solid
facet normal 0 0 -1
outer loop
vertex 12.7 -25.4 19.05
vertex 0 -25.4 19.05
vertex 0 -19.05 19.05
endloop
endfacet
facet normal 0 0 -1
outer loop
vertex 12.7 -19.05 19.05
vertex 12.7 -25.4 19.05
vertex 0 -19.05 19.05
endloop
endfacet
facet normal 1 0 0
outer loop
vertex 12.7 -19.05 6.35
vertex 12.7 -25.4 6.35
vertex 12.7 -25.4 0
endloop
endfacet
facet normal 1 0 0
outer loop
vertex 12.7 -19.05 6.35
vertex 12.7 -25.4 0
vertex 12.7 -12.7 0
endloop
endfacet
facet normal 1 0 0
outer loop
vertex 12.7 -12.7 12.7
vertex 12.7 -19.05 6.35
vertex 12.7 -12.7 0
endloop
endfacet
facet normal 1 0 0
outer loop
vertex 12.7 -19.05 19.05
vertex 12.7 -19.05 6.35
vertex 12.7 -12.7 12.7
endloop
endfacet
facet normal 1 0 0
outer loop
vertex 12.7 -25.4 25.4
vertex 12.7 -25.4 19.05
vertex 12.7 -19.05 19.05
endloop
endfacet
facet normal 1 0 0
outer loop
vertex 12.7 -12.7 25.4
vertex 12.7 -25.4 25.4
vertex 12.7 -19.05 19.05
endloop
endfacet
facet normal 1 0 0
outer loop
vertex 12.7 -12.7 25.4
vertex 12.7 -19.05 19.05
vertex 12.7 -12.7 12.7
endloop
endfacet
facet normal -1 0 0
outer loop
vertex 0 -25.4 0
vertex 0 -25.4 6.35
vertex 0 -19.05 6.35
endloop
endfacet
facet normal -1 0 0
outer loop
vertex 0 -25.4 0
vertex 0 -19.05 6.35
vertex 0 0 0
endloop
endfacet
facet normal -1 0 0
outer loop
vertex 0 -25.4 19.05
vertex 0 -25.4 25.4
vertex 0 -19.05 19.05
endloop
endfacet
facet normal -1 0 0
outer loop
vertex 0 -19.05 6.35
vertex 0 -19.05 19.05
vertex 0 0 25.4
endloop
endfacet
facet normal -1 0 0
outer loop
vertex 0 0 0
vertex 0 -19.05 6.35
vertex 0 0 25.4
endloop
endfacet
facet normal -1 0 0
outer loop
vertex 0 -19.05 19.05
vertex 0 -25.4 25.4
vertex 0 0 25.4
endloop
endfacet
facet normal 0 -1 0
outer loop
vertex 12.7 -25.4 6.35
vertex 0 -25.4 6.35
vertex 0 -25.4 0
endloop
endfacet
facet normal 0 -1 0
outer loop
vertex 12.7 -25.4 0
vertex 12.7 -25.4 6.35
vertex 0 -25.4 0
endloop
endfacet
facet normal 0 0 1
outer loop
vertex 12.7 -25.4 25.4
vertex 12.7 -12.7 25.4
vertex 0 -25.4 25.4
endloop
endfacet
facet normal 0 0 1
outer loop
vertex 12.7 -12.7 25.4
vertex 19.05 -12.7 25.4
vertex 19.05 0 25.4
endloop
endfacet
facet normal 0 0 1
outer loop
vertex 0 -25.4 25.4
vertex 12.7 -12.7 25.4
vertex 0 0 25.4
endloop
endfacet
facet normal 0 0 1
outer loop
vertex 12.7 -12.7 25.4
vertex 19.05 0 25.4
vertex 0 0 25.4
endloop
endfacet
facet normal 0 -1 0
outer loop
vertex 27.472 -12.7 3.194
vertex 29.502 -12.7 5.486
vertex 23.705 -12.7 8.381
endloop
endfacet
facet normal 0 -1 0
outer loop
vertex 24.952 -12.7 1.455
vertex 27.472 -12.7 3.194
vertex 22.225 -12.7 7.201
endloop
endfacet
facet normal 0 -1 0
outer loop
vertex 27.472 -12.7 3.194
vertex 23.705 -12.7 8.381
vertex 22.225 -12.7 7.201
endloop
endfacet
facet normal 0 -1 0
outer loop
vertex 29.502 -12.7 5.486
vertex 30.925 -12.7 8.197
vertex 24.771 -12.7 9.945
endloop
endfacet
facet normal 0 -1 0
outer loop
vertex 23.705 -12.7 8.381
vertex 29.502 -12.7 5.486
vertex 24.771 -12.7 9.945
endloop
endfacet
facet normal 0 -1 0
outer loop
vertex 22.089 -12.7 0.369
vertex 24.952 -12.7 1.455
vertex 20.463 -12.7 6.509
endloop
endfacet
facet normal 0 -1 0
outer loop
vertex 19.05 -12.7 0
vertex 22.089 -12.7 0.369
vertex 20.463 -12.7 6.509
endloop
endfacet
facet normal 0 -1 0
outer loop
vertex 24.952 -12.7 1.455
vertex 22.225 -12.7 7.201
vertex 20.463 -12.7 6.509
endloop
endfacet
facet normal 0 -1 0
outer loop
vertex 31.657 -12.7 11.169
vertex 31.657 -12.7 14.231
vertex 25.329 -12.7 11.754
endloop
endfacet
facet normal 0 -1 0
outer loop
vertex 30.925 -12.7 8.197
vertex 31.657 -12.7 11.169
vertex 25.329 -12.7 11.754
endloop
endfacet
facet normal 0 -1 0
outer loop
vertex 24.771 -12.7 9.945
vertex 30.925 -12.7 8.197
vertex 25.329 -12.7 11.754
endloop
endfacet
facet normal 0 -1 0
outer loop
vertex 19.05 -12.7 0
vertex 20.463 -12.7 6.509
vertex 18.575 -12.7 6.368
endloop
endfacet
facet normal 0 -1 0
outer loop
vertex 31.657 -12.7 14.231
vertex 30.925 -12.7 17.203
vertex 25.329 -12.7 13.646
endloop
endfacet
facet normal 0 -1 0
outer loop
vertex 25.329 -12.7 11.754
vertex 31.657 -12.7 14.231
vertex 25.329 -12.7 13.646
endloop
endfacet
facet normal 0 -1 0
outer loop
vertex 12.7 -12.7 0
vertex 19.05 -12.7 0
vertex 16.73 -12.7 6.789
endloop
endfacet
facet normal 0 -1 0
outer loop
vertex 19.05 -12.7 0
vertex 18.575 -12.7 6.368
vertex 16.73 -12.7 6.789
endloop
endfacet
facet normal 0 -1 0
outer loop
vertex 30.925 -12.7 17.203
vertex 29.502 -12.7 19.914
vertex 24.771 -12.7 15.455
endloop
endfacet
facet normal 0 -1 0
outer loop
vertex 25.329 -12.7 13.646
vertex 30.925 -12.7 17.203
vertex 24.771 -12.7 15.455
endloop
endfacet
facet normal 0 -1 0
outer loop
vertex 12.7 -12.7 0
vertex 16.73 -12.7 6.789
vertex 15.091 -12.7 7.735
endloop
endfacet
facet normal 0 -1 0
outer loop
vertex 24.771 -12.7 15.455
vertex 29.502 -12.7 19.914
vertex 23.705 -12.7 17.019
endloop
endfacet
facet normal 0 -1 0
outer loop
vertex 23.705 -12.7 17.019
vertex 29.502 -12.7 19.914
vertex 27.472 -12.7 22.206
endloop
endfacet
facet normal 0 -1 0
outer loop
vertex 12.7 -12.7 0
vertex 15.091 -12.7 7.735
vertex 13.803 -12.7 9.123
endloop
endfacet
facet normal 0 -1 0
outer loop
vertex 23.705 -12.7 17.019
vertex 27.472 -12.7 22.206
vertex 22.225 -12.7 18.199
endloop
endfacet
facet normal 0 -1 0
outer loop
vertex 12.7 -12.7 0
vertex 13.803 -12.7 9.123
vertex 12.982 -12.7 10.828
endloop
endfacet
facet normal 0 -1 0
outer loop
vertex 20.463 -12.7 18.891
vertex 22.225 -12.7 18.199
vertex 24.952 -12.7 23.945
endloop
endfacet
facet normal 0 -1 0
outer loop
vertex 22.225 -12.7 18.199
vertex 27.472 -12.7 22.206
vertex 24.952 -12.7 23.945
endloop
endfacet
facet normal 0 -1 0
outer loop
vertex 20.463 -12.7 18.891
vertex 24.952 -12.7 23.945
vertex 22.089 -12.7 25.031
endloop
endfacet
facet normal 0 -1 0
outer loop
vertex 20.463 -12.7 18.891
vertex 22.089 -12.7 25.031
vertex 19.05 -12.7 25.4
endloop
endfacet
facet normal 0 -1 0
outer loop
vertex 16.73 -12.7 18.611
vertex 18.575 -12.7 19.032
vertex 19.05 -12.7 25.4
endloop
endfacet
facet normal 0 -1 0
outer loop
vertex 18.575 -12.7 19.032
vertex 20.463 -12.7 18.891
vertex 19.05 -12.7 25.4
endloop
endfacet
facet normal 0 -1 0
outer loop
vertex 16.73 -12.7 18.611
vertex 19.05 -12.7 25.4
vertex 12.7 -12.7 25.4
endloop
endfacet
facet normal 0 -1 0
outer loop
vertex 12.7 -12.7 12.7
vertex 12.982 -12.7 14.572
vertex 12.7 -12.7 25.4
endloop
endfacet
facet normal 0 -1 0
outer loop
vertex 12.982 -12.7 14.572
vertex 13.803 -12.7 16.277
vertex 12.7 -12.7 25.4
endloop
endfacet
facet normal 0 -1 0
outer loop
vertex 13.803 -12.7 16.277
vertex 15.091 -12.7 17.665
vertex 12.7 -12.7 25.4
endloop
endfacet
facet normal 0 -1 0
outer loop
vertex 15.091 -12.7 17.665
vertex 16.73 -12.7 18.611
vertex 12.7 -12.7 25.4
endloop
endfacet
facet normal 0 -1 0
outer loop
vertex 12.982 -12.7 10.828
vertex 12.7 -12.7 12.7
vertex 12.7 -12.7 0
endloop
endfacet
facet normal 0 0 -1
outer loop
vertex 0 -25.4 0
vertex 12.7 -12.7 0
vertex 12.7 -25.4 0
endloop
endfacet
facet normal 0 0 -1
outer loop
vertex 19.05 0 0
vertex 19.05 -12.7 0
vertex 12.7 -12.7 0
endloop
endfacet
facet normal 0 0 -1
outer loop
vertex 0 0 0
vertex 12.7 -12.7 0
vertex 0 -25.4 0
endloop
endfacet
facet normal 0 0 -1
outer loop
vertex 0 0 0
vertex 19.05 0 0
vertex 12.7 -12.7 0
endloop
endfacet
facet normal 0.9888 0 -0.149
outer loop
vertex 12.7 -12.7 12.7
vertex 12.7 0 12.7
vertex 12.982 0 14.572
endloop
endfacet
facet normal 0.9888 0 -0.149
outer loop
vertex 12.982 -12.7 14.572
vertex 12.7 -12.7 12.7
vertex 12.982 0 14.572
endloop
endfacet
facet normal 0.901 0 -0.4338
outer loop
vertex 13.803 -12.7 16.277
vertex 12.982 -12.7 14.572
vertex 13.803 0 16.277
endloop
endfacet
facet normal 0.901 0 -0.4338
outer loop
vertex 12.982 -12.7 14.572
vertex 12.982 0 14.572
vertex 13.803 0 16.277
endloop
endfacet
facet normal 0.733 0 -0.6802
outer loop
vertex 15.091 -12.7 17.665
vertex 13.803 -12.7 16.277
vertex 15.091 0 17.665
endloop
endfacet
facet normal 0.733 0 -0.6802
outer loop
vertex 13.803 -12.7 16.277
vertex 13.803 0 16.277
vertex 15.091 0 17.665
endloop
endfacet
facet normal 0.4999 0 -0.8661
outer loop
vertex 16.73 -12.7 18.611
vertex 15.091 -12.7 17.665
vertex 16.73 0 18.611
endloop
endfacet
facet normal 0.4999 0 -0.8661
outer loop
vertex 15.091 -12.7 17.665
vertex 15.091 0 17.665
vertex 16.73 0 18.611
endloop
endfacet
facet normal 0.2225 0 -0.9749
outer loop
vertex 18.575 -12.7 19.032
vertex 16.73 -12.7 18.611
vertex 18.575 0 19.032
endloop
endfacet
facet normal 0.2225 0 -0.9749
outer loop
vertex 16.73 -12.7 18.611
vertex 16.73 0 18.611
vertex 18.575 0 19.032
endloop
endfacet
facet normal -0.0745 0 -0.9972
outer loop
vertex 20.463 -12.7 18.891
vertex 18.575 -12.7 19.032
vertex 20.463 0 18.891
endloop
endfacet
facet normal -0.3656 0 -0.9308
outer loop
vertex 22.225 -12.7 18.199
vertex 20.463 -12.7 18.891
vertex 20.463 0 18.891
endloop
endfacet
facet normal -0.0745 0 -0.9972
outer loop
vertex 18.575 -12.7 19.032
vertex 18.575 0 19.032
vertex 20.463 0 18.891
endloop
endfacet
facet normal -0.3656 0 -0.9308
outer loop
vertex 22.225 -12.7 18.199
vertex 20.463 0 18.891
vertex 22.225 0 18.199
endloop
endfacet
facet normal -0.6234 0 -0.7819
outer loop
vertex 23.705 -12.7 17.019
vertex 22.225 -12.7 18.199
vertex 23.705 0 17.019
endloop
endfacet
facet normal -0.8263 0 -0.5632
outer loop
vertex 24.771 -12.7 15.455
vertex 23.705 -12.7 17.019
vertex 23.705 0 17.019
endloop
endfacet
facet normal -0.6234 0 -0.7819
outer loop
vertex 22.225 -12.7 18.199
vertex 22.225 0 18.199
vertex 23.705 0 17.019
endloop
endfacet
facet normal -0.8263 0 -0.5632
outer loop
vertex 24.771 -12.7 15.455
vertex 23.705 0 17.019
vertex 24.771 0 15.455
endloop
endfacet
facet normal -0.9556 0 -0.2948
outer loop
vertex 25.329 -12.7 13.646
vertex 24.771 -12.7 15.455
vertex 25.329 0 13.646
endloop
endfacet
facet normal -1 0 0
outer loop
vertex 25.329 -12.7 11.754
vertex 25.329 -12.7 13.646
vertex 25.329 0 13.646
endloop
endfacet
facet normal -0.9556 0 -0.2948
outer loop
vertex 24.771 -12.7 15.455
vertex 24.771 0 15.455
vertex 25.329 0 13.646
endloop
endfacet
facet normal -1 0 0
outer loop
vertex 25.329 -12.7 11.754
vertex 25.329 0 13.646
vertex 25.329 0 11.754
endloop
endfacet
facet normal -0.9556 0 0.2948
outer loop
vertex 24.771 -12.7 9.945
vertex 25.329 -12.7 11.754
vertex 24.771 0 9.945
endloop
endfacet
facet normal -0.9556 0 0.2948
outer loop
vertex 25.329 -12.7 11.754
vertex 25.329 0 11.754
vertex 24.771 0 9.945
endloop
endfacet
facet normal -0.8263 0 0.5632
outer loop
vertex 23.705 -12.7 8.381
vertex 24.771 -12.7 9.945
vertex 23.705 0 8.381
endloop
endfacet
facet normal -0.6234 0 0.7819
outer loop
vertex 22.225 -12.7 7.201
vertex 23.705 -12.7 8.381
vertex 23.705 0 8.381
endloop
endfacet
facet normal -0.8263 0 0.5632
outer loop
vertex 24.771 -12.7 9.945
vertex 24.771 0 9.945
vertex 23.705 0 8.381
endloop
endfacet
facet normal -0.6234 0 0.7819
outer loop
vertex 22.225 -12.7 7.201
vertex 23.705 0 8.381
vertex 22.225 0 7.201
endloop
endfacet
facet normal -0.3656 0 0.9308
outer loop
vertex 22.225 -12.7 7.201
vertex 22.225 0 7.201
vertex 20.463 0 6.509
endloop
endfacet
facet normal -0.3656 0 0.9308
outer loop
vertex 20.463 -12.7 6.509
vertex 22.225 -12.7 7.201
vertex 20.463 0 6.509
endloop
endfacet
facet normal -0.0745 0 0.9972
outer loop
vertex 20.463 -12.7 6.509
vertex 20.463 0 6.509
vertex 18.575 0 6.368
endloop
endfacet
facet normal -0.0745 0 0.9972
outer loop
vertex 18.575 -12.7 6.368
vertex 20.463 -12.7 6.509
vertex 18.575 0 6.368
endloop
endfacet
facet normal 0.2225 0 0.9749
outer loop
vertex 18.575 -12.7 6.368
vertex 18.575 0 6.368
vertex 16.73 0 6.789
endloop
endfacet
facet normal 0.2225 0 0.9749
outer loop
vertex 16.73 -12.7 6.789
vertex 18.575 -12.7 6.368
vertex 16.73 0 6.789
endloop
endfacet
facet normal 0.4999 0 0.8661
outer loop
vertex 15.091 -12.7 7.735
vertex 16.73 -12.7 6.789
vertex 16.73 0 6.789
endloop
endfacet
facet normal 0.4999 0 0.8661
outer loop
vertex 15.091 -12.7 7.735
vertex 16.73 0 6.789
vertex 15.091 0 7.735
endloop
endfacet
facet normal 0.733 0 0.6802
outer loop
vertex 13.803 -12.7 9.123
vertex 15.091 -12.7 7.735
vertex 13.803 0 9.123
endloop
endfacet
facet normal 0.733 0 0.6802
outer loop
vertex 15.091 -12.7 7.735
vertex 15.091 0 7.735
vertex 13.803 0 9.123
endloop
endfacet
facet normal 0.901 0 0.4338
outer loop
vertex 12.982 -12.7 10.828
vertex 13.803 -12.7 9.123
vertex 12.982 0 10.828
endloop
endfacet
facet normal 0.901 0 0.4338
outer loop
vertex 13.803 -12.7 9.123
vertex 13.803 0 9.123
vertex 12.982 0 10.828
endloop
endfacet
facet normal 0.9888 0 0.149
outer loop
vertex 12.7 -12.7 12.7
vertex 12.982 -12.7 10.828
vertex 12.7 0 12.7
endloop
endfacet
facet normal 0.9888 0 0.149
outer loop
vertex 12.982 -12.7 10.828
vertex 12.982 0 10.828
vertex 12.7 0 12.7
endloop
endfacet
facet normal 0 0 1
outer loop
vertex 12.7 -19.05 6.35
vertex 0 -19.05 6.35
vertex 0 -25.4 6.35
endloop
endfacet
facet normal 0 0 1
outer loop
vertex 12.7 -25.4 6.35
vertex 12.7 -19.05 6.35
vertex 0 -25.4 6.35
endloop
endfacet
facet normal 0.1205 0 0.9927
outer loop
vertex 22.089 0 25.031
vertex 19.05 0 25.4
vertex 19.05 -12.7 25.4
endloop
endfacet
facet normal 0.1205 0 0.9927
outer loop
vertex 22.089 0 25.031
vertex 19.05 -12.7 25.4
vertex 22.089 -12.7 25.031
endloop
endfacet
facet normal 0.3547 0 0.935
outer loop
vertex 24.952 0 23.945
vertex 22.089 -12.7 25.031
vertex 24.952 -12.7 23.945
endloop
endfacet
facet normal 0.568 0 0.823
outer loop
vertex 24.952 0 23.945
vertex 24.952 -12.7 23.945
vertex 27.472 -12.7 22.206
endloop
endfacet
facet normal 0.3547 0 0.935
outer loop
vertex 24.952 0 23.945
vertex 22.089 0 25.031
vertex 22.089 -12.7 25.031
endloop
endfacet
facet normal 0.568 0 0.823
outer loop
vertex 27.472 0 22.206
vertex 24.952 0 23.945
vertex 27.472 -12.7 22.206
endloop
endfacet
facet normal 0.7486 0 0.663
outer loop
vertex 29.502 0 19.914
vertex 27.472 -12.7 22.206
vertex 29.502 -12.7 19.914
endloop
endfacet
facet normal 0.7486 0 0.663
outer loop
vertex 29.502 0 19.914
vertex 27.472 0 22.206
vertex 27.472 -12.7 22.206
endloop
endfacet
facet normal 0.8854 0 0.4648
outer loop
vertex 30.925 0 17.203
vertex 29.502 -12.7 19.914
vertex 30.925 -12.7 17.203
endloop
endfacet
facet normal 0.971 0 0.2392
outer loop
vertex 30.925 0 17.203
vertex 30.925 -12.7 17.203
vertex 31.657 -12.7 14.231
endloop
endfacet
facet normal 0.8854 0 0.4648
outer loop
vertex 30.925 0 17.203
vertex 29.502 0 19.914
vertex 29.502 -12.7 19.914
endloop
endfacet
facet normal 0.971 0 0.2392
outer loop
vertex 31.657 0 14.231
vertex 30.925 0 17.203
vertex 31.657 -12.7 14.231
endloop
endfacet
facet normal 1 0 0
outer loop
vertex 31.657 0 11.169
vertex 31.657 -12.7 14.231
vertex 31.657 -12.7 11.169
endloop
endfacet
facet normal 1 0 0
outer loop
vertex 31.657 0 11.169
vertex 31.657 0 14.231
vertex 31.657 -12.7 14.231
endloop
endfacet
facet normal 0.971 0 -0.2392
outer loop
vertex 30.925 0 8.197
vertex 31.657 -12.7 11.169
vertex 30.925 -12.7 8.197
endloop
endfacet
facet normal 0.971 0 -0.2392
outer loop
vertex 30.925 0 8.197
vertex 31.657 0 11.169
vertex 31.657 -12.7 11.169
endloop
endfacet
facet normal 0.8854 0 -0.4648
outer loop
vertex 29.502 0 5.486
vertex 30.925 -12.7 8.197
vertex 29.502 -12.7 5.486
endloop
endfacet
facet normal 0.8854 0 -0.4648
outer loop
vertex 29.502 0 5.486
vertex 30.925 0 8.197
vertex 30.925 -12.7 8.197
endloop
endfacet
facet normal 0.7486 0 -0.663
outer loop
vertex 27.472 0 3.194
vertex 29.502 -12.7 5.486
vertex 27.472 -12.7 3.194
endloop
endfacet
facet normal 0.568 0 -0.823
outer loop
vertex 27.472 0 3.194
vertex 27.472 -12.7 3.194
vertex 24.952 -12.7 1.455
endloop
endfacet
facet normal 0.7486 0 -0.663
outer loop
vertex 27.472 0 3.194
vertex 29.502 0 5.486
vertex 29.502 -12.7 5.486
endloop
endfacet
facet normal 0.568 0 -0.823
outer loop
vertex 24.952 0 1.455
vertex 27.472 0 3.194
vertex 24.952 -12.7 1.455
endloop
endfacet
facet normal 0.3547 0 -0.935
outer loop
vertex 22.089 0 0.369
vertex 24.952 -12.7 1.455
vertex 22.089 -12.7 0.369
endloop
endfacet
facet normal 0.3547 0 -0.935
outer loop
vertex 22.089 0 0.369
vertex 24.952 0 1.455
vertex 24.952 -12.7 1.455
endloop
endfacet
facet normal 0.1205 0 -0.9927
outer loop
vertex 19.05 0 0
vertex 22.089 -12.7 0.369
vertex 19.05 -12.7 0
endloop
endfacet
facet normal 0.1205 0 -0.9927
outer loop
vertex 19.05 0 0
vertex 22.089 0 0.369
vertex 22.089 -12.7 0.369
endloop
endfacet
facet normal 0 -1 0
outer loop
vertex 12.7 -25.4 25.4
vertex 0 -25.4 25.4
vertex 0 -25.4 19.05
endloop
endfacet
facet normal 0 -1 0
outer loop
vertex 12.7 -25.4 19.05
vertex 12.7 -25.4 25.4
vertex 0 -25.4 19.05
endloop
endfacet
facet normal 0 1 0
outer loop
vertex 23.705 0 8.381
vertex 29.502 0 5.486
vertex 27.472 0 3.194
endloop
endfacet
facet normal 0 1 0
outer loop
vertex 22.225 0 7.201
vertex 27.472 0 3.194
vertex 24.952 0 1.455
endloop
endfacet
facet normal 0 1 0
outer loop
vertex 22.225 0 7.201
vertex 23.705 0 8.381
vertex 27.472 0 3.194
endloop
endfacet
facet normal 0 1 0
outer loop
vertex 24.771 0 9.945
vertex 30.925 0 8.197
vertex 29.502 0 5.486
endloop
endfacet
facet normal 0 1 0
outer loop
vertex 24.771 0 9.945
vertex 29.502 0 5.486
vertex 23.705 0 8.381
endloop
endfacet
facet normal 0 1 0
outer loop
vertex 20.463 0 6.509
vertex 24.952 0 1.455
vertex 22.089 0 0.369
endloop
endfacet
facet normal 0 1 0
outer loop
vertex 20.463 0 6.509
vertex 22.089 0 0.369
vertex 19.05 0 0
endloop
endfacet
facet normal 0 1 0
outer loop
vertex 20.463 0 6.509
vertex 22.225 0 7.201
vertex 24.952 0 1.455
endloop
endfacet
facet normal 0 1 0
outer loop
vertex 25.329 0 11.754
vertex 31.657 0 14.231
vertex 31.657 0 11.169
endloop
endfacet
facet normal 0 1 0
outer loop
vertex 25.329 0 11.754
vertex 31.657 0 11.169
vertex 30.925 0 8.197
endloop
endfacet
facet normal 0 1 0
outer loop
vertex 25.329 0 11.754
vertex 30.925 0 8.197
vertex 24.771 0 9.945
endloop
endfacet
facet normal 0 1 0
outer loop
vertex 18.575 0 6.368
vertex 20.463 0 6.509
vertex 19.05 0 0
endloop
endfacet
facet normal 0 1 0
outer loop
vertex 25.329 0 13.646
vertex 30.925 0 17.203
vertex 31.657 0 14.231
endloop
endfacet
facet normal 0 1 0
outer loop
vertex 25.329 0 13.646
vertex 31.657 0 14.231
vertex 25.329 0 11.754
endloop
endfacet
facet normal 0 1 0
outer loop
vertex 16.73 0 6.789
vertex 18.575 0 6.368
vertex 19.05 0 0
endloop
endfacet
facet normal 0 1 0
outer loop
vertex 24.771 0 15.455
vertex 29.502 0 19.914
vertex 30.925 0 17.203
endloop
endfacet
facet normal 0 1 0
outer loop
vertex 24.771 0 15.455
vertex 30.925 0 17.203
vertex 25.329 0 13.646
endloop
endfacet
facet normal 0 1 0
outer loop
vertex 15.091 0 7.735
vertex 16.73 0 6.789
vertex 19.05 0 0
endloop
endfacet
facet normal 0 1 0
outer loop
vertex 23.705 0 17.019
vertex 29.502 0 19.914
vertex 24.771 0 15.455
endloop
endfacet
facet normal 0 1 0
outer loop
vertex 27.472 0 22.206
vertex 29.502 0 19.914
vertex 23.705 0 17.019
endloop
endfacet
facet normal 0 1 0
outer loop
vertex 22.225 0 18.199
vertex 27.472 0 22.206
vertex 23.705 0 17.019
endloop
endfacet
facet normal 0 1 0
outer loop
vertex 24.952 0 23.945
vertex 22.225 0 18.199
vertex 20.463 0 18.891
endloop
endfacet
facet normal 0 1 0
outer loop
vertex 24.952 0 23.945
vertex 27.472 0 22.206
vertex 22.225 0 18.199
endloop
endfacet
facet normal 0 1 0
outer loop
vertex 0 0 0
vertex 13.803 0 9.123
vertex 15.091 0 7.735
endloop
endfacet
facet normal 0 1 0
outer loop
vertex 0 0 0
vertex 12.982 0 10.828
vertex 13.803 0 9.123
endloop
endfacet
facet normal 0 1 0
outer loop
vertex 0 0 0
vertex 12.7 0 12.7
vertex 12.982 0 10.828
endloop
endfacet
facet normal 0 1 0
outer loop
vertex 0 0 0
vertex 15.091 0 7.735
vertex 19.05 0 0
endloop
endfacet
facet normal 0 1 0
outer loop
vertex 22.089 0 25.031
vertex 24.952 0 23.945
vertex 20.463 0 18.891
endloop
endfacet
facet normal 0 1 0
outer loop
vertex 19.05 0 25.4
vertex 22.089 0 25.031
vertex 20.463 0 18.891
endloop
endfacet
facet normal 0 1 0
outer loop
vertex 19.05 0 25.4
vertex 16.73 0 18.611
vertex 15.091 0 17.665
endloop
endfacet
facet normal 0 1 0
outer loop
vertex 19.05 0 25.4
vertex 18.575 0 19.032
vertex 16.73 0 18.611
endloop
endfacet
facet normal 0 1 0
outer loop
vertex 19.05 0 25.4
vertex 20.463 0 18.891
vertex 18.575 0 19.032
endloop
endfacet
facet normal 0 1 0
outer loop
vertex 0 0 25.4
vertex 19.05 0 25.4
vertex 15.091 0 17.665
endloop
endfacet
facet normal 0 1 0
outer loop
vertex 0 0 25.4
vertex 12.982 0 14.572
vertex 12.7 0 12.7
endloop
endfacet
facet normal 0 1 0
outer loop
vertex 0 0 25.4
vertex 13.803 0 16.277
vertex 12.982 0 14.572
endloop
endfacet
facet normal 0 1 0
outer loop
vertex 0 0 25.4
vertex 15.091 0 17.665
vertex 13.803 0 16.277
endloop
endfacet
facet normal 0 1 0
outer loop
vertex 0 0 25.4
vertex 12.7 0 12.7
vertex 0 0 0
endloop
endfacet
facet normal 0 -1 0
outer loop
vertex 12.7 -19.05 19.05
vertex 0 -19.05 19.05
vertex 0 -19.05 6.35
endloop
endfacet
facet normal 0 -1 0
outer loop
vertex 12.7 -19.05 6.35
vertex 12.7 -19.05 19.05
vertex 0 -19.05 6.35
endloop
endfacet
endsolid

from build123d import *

# Parameters (mm, degrees)
F1_DEPTH = 12.7
F2_W     = 6.35
F2_H     = 25.4
F3_DEPTH = 12.7
F5_DEPTH = 12.7
F6_R     = 6.35
F7_DEPTH = 12.7


with BuildPart() as f1:
    # F0 (on Right) → F1 (new body)
    with BuildSketch(Plane.YZ):
        Polygon((-25.4, 0), (0, 0), (0, 25.4), (-25.4, 25.4), (-25.4, 19.05), (-19.05, 19.05), (-19.05, 6.35), (-25.4, 6.35), align=None)
    extrude(amount=F1_DEPTH)

    # F2 (on face) → F3 (join)
    with BuildSketch(Plane(origin=(0, 0, 0), x_dir=(-1, 0, 0), z_dir=(0, 1, 0))):
        with Locations((-15.875, 12.7)):
            Rectangle(F2_W, F2_H)
    extrude(amount=-F3_DEPTH)

    # F4 (on face) → F5 (join)
    with BuildSketch(Plane(origin=(0, 0, 0), x_dir=(-1, 0, 0), z_dir=(0, 1, 0))):
        with BuildLine():
            Line((-19.05, 0), (-19.05, 25.4))
            ThreePointArc((-19.05, 25.4), (-31.75, 12.7), (-19.05, 0))
        make_face()
    extrude(amount=-F5_DEPTH)

    # F6 (on face) → F7 (cut)
    with BuildSketch(Plane(origin=(0, 0, 0), x_dir=(-1, 0, 0), z_dir=(0, 1, 0))):
        with Locations((-19.05, 12.7)):
            Circle(F6_R)
    extrude(amount=-F7_DEPTH, mode=Mode.SUBTRACT)


solid = f1.part
